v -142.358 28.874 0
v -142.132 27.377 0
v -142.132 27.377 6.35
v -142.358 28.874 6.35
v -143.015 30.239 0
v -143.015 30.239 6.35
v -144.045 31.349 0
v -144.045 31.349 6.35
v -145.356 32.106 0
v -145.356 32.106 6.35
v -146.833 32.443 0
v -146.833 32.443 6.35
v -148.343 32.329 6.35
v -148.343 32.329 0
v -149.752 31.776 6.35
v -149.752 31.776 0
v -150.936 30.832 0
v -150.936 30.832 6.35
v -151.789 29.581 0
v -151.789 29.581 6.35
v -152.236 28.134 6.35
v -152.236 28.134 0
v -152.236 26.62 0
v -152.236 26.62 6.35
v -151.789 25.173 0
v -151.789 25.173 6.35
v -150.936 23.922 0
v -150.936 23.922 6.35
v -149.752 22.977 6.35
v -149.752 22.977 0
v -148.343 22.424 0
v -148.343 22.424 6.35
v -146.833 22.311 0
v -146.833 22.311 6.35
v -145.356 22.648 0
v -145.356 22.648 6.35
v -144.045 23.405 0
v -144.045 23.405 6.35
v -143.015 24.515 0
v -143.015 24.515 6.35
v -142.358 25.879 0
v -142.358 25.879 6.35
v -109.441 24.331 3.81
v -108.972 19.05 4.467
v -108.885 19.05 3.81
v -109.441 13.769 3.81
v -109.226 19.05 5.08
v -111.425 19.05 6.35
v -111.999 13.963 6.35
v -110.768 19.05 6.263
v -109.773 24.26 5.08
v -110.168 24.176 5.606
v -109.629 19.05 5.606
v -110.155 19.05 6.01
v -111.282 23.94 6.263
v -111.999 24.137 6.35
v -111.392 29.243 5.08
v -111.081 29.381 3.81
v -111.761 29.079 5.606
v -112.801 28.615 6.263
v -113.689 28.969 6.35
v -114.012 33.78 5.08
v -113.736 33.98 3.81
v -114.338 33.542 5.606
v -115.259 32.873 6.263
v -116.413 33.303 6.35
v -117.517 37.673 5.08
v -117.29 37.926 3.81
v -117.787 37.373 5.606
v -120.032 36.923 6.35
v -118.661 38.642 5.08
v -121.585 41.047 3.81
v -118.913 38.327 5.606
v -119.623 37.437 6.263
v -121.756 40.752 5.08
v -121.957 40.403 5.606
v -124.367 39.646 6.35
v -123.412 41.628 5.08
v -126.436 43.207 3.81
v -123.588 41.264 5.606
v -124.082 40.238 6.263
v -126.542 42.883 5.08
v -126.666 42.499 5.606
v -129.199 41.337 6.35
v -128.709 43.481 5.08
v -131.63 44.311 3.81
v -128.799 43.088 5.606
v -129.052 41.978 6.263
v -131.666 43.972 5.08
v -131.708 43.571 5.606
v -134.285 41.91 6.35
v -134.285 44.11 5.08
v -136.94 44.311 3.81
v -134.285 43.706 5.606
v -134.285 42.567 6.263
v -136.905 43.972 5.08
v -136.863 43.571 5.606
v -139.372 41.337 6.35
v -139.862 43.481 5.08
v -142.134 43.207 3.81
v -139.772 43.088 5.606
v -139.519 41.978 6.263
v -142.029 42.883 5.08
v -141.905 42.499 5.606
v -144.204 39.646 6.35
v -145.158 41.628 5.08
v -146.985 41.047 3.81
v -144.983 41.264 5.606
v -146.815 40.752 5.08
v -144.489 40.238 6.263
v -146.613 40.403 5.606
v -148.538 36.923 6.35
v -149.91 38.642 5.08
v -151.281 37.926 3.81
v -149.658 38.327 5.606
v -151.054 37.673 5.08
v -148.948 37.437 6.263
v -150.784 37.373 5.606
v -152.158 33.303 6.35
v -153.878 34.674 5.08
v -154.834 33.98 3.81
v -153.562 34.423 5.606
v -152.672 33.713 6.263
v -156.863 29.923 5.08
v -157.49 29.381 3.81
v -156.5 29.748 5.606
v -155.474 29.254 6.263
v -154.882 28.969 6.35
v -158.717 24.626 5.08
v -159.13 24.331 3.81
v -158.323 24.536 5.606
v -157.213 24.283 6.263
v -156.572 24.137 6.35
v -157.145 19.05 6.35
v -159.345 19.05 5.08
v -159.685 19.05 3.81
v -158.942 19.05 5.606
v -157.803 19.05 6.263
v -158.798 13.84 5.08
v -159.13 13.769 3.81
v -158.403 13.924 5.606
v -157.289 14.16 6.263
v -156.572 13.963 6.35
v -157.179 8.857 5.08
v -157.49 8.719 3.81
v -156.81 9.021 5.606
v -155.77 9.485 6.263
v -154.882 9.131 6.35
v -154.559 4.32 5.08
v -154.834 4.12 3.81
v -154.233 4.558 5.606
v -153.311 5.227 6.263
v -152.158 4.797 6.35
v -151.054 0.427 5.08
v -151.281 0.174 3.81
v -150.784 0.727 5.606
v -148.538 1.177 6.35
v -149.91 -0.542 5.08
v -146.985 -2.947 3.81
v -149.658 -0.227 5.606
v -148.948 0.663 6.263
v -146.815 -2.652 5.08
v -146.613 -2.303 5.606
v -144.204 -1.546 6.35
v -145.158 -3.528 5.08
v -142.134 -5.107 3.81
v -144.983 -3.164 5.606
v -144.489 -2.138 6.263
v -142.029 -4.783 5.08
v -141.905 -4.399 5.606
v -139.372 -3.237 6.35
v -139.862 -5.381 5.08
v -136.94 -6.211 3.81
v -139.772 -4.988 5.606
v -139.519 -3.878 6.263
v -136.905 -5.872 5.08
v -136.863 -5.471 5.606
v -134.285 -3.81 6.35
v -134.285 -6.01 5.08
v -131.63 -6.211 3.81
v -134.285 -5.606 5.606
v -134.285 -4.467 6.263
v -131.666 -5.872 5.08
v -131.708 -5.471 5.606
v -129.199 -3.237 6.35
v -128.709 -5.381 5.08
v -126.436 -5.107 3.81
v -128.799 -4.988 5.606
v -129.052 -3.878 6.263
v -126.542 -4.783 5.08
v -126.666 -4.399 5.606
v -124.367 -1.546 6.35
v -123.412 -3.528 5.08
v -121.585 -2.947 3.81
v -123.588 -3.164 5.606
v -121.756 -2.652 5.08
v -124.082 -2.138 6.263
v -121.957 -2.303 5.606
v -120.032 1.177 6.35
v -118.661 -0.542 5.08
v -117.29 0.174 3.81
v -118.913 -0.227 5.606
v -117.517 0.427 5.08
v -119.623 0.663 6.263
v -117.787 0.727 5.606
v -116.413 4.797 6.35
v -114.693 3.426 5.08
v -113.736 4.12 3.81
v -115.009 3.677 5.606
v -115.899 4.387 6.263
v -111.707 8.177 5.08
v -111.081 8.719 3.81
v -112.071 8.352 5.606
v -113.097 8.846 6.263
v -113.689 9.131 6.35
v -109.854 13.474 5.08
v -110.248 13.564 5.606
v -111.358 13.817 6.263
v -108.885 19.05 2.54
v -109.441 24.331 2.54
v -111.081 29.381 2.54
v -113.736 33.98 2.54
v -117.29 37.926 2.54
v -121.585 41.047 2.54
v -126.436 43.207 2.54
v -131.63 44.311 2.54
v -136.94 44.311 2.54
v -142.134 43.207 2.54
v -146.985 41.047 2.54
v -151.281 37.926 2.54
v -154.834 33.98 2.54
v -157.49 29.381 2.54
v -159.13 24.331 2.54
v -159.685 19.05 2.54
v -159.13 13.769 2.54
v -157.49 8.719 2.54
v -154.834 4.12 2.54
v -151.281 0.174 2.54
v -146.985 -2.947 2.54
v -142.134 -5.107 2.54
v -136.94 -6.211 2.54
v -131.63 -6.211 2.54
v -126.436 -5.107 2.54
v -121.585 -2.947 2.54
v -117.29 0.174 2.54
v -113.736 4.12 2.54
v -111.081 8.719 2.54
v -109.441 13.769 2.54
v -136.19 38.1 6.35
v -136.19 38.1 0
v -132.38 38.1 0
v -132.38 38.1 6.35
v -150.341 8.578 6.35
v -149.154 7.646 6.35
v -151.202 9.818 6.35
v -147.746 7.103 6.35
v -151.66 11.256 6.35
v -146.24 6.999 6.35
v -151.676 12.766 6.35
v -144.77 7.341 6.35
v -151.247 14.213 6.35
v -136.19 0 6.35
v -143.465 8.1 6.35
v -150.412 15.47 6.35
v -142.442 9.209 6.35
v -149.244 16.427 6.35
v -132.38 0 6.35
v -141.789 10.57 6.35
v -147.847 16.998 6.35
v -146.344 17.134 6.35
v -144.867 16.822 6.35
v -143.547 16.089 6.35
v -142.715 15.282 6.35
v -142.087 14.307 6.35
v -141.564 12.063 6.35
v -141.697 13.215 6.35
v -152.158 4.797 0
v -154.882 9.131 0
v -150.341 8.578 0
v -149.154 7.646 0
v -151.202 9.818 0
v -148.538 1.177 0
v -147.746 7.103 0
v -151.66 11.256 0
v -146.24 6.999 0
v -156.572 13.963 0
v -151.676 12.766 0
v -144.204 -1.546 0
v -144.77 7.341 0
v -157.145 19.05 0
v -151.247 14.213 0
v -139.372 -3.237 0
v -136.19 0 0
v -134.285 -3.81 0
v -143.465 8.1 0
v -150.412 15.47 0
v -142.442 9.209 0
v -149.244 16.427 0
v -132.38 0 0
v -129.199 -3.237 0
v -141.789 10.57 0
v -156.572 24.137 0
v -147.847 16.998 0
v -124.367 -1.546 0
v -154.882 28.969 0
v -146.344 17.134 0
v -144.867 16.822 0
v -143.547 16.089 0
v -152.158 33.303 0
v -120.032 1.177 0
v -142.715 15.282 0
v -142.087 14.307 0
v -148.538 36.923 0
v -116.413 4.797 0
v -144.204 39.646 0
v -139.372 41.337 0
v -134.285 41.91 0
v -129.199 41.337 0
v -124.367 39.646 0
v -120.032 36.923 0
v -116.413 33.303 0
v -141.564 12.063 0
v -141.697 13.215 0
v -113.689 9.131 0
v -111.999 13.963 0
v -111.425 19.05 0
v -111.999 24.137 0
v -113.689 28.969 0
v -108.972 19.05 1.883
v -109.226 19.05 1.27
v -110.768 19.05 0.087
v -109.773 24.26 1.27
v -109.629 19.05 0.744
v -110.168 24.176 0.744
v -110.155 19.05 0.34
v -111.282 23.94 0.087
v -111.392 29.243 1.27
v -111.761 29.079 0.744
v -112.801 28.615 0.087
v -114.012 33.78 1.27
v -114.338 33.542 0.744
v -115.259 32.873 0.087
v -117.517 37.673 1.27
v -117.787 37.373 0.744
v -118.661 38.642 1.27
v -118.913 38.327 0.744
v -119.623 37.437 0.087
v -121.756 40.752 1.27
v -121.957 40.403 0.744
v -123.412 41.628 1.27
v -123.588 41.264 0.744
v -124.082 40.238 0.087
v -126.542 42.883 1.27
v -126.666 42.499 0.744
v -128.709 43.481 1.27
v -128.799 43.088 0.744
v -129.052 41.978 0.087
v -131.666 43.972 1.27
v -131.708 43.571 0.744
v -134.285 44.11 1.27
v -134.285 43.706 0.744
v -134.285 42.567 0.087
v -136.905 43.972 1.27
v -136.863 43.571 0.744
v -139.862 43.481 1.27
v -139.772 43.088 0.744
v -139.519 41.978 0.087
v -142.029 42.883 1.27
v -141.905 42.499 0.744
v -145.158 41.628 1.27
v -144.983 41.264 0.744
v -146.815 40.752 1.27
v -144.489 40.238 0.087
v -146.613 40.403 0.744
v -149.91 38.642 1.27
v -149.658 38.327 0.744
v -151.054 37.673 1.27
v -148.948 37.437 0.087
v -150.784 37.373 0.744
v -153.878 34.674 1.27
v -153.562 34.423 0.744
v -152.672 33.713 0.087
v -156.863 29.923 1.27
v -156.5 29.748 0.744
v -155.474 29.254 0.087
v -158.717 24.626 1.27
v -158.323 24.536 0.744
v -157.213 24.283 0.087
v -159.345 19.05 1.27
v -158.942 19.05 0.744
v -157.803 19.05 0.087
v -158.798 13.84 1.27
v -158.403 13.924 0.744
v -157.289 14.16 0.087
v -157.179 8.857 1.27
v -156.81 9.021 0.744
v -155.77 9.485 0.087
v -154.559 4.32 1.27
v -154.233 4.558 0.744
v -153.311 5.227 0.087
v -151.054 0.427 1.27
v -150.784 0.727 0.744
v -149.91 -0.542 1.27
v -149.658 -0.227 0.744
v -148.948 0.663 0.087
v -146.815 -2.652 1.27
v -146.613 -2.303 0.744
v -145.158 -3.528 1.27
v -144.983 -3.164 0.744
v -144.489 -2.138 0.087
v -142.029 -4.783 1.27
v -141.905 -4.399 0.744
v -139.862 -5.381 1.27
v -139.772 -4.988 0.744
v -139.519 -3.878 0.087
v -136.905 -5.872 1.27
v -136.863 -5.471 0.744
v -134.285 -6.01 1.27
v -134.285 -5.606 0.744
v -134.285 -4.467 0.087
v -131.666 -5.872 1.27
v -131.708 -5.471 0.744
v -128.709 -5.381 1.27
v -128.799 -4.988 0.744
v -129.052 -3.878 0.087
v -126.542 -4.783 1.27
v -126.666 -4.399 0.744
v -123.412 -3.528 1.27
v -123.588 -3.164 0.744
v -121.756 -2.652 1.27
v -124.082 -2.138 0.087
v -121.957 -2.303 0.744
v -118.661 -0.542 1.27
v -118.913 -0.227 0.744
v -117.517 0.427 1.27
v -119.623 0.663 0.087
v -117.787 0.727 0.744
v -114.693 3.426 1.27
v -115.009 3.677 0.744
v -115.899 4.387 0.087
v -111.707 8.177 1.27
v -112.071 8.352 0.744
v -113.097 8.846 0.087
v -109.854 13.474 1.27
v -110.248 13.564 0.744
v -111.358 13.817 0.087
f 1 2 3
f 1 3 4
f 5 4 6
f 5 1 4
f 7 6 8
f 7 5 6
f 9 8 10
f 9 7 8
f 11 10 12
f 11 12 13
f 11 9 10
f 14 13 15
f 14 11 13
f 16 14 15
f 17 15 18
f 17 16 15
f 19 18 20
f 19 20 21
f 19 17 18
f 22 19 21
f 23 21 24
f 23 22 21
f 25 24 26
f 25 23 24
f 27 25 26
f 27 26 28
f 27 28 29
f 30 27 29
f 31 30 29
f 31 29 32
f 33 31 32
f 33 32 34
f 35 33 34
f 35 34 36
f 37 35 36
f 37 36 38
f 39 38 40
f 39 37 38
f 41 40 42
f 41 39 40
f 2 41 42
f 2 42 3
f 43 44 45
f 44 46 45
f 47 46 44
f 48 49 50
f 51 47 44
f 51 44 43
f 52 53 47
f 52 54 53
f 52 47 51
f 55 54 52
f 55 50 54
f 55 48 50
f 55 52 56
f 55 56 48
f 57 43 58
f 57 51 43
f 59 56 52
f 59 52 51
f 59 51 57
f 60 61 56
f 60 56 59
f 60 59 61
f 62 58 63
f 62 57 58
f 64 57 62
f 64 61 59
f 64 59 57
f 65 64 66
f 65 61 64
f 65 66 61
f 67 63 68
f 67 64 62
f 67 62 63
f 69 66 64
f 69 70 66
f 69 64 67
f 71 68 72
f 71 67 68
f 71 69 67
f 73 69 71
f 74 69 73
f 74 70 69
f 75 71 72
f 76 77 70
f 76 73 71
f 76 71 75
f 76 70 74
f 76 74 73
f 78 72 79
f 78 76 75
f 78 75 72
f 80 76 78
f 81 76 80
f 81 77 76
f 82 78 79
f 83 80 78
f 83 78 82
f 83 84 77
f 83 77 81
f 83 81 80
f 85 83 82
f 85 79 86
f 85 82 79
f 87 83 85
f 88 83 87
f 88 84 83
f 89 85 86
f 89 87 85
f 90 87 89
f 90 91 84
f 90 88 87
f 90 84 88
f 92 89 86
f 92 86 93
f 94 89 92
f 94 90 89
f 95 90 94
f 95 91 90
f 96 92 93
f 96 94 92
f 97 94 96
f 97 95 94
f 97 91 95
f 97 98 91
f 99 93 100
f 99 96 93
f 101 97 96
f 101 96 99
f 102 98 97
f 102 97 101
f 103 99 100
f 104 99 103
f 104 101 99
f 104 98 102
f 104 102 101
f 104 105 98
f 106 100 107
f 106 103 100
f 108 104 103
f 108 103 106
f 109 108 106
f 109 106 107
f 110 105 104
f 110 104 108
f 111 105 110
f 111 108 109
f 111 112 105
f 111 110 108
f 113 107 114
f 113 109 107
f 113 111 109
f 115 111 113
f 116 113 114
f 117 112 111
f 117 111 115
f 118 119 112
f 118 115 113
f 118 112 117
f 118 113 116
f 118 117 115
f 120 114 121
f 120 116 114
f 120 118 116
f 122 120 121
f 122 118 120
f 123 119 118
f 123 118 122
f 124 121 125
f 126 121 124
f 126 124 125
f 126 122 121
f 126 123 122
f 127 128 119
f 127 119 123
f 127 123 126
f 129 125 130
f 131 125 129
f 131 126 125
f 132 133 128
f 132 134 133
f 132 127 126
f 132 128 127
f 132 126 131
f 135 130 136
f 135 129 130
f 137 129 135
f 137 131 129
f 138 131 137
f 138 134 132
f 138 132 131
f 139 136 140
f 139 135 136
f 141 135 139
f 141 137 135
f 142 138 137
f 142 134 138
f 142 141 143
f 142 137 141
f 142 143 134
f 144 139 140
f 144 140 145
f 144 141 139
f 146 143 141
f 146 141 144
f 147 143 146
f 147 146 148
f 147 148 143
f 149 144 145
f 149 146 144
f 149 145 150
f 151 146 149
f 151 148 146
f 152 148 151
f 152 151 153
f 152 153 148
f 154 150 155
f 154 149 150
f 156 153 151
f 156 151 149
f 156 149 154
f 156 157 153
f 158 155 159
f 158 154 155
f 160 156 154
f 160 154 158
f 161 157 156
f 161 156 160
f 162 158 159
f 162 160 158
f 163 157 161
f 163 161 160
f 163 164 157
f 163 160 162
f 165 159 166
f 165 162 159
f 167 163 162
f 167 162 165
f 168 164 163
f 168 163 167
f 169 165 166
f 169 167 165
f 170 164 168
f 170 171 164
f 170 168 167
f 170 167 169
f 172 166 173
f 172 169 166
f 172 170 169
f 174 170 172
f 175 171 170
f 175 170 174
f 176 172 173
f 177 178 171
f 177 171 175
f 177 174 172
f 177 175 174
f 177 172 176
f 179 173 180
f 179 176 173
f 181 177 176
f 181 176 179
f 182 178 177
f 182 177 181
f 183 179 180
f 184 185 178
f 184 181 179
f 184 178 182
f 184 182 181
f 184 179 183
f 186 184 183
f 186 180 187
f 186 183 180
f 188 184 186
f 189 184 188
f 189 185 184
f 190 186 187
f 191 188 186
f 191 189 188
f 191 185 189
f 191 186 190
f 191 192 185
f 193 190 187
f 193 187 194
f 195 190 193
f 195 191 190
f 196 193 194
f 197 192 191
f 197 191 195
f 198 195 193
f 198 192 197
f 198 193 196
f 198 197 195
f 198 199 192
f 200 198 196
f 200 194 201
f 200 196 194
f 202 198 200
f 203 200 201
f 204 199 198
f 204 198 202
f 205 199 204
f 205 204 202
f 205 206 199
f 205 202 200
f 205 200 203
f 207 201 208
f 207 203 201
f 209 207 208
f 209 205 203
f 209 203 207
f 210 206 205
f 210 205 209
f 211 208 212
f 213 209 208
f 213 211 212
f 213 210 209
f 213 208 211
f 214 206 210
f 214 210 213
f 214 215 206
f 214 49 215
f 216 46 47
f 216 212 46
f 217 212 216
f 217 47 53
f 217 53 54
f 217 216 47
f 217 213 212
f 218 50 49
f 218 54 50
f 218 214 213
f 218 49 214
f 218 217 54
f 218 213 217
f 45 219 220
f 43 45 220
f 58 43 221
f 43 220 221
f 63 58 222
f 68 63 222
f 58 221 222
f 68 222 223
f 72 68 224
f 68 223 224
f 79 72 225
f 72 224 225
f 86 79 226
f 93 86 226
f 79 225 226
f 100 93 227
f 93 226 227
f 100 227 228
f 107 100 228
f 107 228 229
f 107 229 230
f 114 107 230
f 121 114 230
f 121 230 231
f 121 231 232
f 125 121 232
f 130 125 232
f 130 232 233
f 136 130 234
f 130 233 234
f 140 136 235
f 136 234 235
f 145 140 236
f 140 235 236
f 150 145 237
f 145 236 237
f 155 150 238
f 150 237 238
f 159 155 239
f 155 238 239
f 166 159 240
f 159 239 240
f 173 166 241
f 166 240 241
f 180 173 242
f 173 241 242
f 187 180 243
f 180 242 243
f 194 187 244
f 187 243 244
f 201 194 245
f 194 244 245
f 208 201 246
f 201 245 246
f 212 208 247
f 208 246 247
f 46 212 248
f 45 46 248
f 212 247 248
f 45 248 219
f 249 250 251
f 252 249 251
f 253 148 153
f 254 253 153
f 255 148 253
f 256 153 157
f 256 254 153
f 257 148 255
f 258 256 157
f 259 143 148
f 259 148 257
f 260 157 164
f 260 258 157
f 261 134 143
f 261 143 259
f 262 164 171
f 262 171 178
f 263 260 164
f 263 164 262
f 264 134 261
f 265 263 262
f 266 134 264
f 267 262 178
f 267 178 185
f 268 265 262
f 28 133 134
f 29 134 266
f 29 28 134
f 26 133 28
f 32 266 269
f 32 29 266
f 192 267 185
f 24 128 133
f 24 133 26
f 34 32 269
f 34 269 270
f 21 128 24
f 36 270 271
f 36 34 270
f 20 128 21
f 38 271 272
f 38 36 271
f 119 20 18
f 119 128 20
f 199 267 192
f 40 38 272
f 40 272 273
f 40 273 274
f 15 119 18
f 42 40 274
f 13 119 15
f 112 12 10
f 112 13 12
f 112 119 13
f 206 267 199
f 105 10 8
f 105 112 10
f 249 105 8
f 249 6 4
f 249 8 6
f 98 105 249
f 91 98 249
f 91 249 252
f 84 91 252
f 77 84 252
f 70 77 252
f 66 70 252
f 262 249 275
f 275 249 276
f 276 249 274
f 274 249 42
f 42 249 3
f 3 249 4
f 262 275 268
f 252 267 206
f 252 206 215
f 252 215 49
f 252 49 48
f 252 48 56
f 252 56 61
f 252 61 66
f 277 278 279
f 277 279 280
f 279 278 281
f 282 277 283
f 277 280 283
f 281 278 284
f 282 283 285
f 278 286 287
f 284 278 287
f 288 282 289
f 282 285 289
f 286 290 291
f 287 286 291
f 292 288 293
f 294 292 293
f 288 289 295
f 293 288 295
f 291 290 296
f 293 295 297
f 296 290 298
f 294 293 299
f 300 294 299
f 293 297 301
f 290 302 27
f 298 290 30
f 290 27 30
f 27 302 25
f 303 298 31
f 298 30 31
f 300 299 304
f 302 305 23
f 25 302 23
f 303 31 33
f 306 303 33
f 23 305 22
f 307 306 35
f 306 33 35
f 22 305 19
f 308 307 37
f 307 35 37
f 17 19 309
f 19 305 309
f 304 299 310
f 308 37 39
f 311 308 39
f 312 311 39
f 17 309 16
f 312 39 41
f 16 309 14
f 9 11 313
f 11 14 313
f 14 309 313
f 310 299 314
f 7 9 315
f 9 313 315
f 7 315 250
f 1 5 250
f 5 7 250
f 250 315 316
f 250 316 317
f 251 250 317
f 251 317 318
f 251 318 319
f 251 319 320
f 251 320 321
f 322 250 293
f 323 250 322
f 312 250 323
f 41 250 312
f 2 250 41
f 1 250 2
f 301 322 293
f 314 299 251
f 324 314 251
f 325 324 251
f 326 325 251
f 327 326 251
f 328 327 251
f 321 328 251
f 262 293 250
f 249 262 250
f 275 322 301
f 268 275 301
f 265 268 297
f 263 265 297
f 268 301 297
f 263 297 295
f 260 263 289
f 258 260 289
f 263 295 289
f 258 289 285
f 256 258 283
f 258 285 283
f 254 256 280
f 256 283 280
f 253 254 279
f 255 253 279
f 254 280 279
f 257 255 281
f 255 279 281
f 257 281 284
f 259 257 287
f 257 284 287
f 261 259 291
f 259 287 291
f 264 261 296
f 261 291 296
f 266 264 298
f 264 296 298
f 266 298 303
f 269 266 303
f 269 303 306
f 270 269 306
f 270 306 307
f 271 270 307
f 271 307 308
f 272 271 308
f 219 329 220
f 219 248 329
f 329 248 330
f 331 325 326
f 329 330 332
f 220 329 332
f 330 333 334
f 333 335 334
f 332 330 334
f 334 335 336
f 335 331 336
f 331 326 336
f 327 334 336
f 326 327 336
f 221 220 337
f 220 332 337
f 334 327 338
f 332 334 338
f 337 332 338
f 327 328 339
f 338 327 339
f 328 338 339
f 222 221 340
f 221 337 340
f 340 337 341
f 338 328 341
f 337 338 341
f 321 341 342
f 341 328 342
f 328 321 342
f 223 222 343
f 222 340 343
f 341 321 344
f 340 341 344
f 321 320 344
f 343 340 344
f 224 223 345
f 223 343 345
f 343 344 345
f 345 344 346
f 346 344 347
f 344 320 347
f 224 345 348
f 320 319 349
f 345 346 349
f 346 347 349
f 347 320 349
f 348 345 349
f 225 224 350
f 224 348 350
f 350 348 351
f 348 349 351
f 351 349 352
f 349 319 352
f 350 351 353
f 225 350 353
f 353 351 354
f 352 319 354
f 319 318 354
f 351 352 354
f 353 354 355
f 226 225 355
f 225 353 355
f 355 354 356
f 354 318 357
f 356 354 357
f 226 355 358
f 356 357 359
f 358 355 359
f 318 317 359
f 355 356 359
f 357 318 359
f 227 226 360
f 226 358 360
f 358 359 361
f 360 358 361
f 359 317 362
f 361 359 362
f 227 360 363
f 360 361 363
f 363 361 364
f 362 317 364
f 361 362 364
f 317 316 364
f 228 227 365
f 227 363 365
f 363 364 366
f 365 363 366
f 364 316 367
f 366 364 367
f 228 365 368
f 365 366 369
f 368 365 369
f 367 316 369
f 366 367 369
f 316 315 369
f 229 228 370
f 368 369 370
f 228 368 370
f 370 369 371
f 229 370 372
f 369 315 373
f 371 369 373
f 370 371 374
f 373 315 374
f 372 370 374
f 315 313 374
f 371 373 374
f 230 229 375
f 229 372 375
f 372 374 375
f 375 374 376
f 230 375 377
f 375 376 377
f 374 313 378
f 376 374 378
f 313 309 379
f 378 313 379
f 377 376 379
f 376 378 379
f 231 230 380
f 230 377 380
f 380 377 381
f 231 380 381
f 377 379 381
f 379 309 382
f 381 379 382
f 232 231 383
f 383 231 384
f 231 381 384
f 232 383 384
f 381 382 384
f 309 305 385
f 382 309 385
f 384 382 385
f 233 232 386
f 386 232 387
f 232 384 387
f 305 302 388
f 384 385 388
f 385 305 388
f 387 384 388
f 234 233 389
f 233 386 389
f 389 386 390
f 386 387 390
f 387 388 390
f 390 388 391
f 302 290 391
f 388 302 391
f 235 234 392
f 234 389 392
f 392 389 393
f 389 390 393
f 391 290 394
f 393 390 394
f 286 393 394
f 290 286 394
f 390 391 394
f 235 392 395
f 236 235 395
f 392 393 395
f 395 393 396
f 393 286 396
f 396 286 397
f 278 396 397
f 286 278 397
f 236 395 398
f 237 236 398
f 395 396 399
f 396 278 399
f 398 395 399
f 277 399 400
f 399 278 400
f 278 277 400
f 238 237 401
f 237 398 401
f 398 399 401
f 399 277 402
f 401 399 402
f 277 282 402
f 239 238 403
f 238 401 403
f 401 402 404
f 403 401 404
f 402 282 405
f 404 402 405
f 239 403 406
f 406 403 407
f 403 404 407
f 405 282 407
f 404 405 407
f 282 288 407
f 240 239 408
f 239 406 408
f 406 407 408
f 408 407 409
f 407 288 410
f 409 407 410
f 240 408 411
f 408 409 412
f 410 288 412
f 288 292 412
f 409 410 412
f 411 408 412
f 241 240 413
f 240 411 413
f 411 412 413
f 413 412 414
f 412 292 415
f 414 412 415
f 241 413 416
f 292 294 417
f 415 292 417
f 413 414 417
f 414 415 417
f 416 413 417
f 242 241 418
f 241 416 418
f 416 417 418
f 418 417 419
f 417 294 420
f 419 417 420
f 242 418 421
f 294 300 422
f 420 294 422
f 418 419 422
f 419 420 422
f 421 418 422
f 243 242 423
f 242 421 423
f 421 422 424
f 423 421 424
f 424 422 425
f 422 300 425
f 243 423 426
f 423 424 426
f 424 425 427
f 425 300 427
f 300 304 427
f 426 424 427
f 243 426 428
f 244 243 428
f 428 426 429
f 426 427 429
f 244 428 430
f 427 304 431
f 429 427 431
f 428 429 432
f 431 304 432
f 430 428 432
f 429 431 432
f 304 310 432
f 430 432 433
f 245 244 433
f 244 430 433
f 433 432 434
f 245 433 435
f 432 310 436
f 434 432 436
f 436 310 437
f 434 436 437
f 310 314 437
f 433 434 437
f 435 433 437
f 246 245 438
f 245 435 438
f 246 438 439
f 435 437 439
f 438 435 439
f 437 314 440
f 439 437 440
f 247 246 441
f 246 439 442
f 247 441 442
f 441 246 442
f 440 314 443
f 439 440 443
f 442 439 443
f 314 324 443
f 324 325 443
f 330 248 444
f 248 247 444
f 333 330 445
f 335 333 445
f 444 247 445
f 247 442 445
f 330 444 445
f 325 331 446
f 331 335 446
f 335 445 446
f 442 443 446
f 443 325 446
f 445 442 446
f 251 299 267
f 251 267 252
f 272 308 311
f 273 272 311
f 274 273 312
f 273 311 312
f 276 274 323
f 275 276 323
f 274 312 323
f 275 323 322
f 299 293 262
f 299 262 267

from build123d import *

# Parameters (mm, degrees)
F0_R     = 25.4
F0_R_2   = 5.08
F0_W     = 3.81
F0_H     = 38.1
F1_DEPTH = 6.35
F2_R     = 2.54


with BuildPart() as f1:
    # F0 (on Top) → F1 (new body)
    with BuildSketch(Plane.XY):
        with Locations((-134.285456, 19.05)):
            Circle(F0_R)
        with BuildLine():
            ThreePointArc((-143.547478, 16.089377), (-142.087057, 14.306864), (-141.564401, 12.062535))
            ThreePointArc((-141.564401, 12.062535), (-151.201745, 9.818205), (-143.547478, 16.089377))
        make_face(mode=Mode.SUBTRACT)
        with Locations((-147.212275, 27.376856)):
            Circle(F0_R_2, mode=Mode.SUBTRACT)
        with Locations((-134.285456, 19.05)):
            Rectangle(F0_W, F0_H, mode=Mode.SUBTRACT)
    extrude(amount=F1_DEPTH)

    # F2
    f2_edges = [f1.edges().sort_by_distance(p)[0] for p in [
        (-159.685456, 19.05, 6.35),
        (-159.685456, 19.05, 0),
    ]]
    fillet(f2_edges, radius=F2_R)


solid = f1.part
